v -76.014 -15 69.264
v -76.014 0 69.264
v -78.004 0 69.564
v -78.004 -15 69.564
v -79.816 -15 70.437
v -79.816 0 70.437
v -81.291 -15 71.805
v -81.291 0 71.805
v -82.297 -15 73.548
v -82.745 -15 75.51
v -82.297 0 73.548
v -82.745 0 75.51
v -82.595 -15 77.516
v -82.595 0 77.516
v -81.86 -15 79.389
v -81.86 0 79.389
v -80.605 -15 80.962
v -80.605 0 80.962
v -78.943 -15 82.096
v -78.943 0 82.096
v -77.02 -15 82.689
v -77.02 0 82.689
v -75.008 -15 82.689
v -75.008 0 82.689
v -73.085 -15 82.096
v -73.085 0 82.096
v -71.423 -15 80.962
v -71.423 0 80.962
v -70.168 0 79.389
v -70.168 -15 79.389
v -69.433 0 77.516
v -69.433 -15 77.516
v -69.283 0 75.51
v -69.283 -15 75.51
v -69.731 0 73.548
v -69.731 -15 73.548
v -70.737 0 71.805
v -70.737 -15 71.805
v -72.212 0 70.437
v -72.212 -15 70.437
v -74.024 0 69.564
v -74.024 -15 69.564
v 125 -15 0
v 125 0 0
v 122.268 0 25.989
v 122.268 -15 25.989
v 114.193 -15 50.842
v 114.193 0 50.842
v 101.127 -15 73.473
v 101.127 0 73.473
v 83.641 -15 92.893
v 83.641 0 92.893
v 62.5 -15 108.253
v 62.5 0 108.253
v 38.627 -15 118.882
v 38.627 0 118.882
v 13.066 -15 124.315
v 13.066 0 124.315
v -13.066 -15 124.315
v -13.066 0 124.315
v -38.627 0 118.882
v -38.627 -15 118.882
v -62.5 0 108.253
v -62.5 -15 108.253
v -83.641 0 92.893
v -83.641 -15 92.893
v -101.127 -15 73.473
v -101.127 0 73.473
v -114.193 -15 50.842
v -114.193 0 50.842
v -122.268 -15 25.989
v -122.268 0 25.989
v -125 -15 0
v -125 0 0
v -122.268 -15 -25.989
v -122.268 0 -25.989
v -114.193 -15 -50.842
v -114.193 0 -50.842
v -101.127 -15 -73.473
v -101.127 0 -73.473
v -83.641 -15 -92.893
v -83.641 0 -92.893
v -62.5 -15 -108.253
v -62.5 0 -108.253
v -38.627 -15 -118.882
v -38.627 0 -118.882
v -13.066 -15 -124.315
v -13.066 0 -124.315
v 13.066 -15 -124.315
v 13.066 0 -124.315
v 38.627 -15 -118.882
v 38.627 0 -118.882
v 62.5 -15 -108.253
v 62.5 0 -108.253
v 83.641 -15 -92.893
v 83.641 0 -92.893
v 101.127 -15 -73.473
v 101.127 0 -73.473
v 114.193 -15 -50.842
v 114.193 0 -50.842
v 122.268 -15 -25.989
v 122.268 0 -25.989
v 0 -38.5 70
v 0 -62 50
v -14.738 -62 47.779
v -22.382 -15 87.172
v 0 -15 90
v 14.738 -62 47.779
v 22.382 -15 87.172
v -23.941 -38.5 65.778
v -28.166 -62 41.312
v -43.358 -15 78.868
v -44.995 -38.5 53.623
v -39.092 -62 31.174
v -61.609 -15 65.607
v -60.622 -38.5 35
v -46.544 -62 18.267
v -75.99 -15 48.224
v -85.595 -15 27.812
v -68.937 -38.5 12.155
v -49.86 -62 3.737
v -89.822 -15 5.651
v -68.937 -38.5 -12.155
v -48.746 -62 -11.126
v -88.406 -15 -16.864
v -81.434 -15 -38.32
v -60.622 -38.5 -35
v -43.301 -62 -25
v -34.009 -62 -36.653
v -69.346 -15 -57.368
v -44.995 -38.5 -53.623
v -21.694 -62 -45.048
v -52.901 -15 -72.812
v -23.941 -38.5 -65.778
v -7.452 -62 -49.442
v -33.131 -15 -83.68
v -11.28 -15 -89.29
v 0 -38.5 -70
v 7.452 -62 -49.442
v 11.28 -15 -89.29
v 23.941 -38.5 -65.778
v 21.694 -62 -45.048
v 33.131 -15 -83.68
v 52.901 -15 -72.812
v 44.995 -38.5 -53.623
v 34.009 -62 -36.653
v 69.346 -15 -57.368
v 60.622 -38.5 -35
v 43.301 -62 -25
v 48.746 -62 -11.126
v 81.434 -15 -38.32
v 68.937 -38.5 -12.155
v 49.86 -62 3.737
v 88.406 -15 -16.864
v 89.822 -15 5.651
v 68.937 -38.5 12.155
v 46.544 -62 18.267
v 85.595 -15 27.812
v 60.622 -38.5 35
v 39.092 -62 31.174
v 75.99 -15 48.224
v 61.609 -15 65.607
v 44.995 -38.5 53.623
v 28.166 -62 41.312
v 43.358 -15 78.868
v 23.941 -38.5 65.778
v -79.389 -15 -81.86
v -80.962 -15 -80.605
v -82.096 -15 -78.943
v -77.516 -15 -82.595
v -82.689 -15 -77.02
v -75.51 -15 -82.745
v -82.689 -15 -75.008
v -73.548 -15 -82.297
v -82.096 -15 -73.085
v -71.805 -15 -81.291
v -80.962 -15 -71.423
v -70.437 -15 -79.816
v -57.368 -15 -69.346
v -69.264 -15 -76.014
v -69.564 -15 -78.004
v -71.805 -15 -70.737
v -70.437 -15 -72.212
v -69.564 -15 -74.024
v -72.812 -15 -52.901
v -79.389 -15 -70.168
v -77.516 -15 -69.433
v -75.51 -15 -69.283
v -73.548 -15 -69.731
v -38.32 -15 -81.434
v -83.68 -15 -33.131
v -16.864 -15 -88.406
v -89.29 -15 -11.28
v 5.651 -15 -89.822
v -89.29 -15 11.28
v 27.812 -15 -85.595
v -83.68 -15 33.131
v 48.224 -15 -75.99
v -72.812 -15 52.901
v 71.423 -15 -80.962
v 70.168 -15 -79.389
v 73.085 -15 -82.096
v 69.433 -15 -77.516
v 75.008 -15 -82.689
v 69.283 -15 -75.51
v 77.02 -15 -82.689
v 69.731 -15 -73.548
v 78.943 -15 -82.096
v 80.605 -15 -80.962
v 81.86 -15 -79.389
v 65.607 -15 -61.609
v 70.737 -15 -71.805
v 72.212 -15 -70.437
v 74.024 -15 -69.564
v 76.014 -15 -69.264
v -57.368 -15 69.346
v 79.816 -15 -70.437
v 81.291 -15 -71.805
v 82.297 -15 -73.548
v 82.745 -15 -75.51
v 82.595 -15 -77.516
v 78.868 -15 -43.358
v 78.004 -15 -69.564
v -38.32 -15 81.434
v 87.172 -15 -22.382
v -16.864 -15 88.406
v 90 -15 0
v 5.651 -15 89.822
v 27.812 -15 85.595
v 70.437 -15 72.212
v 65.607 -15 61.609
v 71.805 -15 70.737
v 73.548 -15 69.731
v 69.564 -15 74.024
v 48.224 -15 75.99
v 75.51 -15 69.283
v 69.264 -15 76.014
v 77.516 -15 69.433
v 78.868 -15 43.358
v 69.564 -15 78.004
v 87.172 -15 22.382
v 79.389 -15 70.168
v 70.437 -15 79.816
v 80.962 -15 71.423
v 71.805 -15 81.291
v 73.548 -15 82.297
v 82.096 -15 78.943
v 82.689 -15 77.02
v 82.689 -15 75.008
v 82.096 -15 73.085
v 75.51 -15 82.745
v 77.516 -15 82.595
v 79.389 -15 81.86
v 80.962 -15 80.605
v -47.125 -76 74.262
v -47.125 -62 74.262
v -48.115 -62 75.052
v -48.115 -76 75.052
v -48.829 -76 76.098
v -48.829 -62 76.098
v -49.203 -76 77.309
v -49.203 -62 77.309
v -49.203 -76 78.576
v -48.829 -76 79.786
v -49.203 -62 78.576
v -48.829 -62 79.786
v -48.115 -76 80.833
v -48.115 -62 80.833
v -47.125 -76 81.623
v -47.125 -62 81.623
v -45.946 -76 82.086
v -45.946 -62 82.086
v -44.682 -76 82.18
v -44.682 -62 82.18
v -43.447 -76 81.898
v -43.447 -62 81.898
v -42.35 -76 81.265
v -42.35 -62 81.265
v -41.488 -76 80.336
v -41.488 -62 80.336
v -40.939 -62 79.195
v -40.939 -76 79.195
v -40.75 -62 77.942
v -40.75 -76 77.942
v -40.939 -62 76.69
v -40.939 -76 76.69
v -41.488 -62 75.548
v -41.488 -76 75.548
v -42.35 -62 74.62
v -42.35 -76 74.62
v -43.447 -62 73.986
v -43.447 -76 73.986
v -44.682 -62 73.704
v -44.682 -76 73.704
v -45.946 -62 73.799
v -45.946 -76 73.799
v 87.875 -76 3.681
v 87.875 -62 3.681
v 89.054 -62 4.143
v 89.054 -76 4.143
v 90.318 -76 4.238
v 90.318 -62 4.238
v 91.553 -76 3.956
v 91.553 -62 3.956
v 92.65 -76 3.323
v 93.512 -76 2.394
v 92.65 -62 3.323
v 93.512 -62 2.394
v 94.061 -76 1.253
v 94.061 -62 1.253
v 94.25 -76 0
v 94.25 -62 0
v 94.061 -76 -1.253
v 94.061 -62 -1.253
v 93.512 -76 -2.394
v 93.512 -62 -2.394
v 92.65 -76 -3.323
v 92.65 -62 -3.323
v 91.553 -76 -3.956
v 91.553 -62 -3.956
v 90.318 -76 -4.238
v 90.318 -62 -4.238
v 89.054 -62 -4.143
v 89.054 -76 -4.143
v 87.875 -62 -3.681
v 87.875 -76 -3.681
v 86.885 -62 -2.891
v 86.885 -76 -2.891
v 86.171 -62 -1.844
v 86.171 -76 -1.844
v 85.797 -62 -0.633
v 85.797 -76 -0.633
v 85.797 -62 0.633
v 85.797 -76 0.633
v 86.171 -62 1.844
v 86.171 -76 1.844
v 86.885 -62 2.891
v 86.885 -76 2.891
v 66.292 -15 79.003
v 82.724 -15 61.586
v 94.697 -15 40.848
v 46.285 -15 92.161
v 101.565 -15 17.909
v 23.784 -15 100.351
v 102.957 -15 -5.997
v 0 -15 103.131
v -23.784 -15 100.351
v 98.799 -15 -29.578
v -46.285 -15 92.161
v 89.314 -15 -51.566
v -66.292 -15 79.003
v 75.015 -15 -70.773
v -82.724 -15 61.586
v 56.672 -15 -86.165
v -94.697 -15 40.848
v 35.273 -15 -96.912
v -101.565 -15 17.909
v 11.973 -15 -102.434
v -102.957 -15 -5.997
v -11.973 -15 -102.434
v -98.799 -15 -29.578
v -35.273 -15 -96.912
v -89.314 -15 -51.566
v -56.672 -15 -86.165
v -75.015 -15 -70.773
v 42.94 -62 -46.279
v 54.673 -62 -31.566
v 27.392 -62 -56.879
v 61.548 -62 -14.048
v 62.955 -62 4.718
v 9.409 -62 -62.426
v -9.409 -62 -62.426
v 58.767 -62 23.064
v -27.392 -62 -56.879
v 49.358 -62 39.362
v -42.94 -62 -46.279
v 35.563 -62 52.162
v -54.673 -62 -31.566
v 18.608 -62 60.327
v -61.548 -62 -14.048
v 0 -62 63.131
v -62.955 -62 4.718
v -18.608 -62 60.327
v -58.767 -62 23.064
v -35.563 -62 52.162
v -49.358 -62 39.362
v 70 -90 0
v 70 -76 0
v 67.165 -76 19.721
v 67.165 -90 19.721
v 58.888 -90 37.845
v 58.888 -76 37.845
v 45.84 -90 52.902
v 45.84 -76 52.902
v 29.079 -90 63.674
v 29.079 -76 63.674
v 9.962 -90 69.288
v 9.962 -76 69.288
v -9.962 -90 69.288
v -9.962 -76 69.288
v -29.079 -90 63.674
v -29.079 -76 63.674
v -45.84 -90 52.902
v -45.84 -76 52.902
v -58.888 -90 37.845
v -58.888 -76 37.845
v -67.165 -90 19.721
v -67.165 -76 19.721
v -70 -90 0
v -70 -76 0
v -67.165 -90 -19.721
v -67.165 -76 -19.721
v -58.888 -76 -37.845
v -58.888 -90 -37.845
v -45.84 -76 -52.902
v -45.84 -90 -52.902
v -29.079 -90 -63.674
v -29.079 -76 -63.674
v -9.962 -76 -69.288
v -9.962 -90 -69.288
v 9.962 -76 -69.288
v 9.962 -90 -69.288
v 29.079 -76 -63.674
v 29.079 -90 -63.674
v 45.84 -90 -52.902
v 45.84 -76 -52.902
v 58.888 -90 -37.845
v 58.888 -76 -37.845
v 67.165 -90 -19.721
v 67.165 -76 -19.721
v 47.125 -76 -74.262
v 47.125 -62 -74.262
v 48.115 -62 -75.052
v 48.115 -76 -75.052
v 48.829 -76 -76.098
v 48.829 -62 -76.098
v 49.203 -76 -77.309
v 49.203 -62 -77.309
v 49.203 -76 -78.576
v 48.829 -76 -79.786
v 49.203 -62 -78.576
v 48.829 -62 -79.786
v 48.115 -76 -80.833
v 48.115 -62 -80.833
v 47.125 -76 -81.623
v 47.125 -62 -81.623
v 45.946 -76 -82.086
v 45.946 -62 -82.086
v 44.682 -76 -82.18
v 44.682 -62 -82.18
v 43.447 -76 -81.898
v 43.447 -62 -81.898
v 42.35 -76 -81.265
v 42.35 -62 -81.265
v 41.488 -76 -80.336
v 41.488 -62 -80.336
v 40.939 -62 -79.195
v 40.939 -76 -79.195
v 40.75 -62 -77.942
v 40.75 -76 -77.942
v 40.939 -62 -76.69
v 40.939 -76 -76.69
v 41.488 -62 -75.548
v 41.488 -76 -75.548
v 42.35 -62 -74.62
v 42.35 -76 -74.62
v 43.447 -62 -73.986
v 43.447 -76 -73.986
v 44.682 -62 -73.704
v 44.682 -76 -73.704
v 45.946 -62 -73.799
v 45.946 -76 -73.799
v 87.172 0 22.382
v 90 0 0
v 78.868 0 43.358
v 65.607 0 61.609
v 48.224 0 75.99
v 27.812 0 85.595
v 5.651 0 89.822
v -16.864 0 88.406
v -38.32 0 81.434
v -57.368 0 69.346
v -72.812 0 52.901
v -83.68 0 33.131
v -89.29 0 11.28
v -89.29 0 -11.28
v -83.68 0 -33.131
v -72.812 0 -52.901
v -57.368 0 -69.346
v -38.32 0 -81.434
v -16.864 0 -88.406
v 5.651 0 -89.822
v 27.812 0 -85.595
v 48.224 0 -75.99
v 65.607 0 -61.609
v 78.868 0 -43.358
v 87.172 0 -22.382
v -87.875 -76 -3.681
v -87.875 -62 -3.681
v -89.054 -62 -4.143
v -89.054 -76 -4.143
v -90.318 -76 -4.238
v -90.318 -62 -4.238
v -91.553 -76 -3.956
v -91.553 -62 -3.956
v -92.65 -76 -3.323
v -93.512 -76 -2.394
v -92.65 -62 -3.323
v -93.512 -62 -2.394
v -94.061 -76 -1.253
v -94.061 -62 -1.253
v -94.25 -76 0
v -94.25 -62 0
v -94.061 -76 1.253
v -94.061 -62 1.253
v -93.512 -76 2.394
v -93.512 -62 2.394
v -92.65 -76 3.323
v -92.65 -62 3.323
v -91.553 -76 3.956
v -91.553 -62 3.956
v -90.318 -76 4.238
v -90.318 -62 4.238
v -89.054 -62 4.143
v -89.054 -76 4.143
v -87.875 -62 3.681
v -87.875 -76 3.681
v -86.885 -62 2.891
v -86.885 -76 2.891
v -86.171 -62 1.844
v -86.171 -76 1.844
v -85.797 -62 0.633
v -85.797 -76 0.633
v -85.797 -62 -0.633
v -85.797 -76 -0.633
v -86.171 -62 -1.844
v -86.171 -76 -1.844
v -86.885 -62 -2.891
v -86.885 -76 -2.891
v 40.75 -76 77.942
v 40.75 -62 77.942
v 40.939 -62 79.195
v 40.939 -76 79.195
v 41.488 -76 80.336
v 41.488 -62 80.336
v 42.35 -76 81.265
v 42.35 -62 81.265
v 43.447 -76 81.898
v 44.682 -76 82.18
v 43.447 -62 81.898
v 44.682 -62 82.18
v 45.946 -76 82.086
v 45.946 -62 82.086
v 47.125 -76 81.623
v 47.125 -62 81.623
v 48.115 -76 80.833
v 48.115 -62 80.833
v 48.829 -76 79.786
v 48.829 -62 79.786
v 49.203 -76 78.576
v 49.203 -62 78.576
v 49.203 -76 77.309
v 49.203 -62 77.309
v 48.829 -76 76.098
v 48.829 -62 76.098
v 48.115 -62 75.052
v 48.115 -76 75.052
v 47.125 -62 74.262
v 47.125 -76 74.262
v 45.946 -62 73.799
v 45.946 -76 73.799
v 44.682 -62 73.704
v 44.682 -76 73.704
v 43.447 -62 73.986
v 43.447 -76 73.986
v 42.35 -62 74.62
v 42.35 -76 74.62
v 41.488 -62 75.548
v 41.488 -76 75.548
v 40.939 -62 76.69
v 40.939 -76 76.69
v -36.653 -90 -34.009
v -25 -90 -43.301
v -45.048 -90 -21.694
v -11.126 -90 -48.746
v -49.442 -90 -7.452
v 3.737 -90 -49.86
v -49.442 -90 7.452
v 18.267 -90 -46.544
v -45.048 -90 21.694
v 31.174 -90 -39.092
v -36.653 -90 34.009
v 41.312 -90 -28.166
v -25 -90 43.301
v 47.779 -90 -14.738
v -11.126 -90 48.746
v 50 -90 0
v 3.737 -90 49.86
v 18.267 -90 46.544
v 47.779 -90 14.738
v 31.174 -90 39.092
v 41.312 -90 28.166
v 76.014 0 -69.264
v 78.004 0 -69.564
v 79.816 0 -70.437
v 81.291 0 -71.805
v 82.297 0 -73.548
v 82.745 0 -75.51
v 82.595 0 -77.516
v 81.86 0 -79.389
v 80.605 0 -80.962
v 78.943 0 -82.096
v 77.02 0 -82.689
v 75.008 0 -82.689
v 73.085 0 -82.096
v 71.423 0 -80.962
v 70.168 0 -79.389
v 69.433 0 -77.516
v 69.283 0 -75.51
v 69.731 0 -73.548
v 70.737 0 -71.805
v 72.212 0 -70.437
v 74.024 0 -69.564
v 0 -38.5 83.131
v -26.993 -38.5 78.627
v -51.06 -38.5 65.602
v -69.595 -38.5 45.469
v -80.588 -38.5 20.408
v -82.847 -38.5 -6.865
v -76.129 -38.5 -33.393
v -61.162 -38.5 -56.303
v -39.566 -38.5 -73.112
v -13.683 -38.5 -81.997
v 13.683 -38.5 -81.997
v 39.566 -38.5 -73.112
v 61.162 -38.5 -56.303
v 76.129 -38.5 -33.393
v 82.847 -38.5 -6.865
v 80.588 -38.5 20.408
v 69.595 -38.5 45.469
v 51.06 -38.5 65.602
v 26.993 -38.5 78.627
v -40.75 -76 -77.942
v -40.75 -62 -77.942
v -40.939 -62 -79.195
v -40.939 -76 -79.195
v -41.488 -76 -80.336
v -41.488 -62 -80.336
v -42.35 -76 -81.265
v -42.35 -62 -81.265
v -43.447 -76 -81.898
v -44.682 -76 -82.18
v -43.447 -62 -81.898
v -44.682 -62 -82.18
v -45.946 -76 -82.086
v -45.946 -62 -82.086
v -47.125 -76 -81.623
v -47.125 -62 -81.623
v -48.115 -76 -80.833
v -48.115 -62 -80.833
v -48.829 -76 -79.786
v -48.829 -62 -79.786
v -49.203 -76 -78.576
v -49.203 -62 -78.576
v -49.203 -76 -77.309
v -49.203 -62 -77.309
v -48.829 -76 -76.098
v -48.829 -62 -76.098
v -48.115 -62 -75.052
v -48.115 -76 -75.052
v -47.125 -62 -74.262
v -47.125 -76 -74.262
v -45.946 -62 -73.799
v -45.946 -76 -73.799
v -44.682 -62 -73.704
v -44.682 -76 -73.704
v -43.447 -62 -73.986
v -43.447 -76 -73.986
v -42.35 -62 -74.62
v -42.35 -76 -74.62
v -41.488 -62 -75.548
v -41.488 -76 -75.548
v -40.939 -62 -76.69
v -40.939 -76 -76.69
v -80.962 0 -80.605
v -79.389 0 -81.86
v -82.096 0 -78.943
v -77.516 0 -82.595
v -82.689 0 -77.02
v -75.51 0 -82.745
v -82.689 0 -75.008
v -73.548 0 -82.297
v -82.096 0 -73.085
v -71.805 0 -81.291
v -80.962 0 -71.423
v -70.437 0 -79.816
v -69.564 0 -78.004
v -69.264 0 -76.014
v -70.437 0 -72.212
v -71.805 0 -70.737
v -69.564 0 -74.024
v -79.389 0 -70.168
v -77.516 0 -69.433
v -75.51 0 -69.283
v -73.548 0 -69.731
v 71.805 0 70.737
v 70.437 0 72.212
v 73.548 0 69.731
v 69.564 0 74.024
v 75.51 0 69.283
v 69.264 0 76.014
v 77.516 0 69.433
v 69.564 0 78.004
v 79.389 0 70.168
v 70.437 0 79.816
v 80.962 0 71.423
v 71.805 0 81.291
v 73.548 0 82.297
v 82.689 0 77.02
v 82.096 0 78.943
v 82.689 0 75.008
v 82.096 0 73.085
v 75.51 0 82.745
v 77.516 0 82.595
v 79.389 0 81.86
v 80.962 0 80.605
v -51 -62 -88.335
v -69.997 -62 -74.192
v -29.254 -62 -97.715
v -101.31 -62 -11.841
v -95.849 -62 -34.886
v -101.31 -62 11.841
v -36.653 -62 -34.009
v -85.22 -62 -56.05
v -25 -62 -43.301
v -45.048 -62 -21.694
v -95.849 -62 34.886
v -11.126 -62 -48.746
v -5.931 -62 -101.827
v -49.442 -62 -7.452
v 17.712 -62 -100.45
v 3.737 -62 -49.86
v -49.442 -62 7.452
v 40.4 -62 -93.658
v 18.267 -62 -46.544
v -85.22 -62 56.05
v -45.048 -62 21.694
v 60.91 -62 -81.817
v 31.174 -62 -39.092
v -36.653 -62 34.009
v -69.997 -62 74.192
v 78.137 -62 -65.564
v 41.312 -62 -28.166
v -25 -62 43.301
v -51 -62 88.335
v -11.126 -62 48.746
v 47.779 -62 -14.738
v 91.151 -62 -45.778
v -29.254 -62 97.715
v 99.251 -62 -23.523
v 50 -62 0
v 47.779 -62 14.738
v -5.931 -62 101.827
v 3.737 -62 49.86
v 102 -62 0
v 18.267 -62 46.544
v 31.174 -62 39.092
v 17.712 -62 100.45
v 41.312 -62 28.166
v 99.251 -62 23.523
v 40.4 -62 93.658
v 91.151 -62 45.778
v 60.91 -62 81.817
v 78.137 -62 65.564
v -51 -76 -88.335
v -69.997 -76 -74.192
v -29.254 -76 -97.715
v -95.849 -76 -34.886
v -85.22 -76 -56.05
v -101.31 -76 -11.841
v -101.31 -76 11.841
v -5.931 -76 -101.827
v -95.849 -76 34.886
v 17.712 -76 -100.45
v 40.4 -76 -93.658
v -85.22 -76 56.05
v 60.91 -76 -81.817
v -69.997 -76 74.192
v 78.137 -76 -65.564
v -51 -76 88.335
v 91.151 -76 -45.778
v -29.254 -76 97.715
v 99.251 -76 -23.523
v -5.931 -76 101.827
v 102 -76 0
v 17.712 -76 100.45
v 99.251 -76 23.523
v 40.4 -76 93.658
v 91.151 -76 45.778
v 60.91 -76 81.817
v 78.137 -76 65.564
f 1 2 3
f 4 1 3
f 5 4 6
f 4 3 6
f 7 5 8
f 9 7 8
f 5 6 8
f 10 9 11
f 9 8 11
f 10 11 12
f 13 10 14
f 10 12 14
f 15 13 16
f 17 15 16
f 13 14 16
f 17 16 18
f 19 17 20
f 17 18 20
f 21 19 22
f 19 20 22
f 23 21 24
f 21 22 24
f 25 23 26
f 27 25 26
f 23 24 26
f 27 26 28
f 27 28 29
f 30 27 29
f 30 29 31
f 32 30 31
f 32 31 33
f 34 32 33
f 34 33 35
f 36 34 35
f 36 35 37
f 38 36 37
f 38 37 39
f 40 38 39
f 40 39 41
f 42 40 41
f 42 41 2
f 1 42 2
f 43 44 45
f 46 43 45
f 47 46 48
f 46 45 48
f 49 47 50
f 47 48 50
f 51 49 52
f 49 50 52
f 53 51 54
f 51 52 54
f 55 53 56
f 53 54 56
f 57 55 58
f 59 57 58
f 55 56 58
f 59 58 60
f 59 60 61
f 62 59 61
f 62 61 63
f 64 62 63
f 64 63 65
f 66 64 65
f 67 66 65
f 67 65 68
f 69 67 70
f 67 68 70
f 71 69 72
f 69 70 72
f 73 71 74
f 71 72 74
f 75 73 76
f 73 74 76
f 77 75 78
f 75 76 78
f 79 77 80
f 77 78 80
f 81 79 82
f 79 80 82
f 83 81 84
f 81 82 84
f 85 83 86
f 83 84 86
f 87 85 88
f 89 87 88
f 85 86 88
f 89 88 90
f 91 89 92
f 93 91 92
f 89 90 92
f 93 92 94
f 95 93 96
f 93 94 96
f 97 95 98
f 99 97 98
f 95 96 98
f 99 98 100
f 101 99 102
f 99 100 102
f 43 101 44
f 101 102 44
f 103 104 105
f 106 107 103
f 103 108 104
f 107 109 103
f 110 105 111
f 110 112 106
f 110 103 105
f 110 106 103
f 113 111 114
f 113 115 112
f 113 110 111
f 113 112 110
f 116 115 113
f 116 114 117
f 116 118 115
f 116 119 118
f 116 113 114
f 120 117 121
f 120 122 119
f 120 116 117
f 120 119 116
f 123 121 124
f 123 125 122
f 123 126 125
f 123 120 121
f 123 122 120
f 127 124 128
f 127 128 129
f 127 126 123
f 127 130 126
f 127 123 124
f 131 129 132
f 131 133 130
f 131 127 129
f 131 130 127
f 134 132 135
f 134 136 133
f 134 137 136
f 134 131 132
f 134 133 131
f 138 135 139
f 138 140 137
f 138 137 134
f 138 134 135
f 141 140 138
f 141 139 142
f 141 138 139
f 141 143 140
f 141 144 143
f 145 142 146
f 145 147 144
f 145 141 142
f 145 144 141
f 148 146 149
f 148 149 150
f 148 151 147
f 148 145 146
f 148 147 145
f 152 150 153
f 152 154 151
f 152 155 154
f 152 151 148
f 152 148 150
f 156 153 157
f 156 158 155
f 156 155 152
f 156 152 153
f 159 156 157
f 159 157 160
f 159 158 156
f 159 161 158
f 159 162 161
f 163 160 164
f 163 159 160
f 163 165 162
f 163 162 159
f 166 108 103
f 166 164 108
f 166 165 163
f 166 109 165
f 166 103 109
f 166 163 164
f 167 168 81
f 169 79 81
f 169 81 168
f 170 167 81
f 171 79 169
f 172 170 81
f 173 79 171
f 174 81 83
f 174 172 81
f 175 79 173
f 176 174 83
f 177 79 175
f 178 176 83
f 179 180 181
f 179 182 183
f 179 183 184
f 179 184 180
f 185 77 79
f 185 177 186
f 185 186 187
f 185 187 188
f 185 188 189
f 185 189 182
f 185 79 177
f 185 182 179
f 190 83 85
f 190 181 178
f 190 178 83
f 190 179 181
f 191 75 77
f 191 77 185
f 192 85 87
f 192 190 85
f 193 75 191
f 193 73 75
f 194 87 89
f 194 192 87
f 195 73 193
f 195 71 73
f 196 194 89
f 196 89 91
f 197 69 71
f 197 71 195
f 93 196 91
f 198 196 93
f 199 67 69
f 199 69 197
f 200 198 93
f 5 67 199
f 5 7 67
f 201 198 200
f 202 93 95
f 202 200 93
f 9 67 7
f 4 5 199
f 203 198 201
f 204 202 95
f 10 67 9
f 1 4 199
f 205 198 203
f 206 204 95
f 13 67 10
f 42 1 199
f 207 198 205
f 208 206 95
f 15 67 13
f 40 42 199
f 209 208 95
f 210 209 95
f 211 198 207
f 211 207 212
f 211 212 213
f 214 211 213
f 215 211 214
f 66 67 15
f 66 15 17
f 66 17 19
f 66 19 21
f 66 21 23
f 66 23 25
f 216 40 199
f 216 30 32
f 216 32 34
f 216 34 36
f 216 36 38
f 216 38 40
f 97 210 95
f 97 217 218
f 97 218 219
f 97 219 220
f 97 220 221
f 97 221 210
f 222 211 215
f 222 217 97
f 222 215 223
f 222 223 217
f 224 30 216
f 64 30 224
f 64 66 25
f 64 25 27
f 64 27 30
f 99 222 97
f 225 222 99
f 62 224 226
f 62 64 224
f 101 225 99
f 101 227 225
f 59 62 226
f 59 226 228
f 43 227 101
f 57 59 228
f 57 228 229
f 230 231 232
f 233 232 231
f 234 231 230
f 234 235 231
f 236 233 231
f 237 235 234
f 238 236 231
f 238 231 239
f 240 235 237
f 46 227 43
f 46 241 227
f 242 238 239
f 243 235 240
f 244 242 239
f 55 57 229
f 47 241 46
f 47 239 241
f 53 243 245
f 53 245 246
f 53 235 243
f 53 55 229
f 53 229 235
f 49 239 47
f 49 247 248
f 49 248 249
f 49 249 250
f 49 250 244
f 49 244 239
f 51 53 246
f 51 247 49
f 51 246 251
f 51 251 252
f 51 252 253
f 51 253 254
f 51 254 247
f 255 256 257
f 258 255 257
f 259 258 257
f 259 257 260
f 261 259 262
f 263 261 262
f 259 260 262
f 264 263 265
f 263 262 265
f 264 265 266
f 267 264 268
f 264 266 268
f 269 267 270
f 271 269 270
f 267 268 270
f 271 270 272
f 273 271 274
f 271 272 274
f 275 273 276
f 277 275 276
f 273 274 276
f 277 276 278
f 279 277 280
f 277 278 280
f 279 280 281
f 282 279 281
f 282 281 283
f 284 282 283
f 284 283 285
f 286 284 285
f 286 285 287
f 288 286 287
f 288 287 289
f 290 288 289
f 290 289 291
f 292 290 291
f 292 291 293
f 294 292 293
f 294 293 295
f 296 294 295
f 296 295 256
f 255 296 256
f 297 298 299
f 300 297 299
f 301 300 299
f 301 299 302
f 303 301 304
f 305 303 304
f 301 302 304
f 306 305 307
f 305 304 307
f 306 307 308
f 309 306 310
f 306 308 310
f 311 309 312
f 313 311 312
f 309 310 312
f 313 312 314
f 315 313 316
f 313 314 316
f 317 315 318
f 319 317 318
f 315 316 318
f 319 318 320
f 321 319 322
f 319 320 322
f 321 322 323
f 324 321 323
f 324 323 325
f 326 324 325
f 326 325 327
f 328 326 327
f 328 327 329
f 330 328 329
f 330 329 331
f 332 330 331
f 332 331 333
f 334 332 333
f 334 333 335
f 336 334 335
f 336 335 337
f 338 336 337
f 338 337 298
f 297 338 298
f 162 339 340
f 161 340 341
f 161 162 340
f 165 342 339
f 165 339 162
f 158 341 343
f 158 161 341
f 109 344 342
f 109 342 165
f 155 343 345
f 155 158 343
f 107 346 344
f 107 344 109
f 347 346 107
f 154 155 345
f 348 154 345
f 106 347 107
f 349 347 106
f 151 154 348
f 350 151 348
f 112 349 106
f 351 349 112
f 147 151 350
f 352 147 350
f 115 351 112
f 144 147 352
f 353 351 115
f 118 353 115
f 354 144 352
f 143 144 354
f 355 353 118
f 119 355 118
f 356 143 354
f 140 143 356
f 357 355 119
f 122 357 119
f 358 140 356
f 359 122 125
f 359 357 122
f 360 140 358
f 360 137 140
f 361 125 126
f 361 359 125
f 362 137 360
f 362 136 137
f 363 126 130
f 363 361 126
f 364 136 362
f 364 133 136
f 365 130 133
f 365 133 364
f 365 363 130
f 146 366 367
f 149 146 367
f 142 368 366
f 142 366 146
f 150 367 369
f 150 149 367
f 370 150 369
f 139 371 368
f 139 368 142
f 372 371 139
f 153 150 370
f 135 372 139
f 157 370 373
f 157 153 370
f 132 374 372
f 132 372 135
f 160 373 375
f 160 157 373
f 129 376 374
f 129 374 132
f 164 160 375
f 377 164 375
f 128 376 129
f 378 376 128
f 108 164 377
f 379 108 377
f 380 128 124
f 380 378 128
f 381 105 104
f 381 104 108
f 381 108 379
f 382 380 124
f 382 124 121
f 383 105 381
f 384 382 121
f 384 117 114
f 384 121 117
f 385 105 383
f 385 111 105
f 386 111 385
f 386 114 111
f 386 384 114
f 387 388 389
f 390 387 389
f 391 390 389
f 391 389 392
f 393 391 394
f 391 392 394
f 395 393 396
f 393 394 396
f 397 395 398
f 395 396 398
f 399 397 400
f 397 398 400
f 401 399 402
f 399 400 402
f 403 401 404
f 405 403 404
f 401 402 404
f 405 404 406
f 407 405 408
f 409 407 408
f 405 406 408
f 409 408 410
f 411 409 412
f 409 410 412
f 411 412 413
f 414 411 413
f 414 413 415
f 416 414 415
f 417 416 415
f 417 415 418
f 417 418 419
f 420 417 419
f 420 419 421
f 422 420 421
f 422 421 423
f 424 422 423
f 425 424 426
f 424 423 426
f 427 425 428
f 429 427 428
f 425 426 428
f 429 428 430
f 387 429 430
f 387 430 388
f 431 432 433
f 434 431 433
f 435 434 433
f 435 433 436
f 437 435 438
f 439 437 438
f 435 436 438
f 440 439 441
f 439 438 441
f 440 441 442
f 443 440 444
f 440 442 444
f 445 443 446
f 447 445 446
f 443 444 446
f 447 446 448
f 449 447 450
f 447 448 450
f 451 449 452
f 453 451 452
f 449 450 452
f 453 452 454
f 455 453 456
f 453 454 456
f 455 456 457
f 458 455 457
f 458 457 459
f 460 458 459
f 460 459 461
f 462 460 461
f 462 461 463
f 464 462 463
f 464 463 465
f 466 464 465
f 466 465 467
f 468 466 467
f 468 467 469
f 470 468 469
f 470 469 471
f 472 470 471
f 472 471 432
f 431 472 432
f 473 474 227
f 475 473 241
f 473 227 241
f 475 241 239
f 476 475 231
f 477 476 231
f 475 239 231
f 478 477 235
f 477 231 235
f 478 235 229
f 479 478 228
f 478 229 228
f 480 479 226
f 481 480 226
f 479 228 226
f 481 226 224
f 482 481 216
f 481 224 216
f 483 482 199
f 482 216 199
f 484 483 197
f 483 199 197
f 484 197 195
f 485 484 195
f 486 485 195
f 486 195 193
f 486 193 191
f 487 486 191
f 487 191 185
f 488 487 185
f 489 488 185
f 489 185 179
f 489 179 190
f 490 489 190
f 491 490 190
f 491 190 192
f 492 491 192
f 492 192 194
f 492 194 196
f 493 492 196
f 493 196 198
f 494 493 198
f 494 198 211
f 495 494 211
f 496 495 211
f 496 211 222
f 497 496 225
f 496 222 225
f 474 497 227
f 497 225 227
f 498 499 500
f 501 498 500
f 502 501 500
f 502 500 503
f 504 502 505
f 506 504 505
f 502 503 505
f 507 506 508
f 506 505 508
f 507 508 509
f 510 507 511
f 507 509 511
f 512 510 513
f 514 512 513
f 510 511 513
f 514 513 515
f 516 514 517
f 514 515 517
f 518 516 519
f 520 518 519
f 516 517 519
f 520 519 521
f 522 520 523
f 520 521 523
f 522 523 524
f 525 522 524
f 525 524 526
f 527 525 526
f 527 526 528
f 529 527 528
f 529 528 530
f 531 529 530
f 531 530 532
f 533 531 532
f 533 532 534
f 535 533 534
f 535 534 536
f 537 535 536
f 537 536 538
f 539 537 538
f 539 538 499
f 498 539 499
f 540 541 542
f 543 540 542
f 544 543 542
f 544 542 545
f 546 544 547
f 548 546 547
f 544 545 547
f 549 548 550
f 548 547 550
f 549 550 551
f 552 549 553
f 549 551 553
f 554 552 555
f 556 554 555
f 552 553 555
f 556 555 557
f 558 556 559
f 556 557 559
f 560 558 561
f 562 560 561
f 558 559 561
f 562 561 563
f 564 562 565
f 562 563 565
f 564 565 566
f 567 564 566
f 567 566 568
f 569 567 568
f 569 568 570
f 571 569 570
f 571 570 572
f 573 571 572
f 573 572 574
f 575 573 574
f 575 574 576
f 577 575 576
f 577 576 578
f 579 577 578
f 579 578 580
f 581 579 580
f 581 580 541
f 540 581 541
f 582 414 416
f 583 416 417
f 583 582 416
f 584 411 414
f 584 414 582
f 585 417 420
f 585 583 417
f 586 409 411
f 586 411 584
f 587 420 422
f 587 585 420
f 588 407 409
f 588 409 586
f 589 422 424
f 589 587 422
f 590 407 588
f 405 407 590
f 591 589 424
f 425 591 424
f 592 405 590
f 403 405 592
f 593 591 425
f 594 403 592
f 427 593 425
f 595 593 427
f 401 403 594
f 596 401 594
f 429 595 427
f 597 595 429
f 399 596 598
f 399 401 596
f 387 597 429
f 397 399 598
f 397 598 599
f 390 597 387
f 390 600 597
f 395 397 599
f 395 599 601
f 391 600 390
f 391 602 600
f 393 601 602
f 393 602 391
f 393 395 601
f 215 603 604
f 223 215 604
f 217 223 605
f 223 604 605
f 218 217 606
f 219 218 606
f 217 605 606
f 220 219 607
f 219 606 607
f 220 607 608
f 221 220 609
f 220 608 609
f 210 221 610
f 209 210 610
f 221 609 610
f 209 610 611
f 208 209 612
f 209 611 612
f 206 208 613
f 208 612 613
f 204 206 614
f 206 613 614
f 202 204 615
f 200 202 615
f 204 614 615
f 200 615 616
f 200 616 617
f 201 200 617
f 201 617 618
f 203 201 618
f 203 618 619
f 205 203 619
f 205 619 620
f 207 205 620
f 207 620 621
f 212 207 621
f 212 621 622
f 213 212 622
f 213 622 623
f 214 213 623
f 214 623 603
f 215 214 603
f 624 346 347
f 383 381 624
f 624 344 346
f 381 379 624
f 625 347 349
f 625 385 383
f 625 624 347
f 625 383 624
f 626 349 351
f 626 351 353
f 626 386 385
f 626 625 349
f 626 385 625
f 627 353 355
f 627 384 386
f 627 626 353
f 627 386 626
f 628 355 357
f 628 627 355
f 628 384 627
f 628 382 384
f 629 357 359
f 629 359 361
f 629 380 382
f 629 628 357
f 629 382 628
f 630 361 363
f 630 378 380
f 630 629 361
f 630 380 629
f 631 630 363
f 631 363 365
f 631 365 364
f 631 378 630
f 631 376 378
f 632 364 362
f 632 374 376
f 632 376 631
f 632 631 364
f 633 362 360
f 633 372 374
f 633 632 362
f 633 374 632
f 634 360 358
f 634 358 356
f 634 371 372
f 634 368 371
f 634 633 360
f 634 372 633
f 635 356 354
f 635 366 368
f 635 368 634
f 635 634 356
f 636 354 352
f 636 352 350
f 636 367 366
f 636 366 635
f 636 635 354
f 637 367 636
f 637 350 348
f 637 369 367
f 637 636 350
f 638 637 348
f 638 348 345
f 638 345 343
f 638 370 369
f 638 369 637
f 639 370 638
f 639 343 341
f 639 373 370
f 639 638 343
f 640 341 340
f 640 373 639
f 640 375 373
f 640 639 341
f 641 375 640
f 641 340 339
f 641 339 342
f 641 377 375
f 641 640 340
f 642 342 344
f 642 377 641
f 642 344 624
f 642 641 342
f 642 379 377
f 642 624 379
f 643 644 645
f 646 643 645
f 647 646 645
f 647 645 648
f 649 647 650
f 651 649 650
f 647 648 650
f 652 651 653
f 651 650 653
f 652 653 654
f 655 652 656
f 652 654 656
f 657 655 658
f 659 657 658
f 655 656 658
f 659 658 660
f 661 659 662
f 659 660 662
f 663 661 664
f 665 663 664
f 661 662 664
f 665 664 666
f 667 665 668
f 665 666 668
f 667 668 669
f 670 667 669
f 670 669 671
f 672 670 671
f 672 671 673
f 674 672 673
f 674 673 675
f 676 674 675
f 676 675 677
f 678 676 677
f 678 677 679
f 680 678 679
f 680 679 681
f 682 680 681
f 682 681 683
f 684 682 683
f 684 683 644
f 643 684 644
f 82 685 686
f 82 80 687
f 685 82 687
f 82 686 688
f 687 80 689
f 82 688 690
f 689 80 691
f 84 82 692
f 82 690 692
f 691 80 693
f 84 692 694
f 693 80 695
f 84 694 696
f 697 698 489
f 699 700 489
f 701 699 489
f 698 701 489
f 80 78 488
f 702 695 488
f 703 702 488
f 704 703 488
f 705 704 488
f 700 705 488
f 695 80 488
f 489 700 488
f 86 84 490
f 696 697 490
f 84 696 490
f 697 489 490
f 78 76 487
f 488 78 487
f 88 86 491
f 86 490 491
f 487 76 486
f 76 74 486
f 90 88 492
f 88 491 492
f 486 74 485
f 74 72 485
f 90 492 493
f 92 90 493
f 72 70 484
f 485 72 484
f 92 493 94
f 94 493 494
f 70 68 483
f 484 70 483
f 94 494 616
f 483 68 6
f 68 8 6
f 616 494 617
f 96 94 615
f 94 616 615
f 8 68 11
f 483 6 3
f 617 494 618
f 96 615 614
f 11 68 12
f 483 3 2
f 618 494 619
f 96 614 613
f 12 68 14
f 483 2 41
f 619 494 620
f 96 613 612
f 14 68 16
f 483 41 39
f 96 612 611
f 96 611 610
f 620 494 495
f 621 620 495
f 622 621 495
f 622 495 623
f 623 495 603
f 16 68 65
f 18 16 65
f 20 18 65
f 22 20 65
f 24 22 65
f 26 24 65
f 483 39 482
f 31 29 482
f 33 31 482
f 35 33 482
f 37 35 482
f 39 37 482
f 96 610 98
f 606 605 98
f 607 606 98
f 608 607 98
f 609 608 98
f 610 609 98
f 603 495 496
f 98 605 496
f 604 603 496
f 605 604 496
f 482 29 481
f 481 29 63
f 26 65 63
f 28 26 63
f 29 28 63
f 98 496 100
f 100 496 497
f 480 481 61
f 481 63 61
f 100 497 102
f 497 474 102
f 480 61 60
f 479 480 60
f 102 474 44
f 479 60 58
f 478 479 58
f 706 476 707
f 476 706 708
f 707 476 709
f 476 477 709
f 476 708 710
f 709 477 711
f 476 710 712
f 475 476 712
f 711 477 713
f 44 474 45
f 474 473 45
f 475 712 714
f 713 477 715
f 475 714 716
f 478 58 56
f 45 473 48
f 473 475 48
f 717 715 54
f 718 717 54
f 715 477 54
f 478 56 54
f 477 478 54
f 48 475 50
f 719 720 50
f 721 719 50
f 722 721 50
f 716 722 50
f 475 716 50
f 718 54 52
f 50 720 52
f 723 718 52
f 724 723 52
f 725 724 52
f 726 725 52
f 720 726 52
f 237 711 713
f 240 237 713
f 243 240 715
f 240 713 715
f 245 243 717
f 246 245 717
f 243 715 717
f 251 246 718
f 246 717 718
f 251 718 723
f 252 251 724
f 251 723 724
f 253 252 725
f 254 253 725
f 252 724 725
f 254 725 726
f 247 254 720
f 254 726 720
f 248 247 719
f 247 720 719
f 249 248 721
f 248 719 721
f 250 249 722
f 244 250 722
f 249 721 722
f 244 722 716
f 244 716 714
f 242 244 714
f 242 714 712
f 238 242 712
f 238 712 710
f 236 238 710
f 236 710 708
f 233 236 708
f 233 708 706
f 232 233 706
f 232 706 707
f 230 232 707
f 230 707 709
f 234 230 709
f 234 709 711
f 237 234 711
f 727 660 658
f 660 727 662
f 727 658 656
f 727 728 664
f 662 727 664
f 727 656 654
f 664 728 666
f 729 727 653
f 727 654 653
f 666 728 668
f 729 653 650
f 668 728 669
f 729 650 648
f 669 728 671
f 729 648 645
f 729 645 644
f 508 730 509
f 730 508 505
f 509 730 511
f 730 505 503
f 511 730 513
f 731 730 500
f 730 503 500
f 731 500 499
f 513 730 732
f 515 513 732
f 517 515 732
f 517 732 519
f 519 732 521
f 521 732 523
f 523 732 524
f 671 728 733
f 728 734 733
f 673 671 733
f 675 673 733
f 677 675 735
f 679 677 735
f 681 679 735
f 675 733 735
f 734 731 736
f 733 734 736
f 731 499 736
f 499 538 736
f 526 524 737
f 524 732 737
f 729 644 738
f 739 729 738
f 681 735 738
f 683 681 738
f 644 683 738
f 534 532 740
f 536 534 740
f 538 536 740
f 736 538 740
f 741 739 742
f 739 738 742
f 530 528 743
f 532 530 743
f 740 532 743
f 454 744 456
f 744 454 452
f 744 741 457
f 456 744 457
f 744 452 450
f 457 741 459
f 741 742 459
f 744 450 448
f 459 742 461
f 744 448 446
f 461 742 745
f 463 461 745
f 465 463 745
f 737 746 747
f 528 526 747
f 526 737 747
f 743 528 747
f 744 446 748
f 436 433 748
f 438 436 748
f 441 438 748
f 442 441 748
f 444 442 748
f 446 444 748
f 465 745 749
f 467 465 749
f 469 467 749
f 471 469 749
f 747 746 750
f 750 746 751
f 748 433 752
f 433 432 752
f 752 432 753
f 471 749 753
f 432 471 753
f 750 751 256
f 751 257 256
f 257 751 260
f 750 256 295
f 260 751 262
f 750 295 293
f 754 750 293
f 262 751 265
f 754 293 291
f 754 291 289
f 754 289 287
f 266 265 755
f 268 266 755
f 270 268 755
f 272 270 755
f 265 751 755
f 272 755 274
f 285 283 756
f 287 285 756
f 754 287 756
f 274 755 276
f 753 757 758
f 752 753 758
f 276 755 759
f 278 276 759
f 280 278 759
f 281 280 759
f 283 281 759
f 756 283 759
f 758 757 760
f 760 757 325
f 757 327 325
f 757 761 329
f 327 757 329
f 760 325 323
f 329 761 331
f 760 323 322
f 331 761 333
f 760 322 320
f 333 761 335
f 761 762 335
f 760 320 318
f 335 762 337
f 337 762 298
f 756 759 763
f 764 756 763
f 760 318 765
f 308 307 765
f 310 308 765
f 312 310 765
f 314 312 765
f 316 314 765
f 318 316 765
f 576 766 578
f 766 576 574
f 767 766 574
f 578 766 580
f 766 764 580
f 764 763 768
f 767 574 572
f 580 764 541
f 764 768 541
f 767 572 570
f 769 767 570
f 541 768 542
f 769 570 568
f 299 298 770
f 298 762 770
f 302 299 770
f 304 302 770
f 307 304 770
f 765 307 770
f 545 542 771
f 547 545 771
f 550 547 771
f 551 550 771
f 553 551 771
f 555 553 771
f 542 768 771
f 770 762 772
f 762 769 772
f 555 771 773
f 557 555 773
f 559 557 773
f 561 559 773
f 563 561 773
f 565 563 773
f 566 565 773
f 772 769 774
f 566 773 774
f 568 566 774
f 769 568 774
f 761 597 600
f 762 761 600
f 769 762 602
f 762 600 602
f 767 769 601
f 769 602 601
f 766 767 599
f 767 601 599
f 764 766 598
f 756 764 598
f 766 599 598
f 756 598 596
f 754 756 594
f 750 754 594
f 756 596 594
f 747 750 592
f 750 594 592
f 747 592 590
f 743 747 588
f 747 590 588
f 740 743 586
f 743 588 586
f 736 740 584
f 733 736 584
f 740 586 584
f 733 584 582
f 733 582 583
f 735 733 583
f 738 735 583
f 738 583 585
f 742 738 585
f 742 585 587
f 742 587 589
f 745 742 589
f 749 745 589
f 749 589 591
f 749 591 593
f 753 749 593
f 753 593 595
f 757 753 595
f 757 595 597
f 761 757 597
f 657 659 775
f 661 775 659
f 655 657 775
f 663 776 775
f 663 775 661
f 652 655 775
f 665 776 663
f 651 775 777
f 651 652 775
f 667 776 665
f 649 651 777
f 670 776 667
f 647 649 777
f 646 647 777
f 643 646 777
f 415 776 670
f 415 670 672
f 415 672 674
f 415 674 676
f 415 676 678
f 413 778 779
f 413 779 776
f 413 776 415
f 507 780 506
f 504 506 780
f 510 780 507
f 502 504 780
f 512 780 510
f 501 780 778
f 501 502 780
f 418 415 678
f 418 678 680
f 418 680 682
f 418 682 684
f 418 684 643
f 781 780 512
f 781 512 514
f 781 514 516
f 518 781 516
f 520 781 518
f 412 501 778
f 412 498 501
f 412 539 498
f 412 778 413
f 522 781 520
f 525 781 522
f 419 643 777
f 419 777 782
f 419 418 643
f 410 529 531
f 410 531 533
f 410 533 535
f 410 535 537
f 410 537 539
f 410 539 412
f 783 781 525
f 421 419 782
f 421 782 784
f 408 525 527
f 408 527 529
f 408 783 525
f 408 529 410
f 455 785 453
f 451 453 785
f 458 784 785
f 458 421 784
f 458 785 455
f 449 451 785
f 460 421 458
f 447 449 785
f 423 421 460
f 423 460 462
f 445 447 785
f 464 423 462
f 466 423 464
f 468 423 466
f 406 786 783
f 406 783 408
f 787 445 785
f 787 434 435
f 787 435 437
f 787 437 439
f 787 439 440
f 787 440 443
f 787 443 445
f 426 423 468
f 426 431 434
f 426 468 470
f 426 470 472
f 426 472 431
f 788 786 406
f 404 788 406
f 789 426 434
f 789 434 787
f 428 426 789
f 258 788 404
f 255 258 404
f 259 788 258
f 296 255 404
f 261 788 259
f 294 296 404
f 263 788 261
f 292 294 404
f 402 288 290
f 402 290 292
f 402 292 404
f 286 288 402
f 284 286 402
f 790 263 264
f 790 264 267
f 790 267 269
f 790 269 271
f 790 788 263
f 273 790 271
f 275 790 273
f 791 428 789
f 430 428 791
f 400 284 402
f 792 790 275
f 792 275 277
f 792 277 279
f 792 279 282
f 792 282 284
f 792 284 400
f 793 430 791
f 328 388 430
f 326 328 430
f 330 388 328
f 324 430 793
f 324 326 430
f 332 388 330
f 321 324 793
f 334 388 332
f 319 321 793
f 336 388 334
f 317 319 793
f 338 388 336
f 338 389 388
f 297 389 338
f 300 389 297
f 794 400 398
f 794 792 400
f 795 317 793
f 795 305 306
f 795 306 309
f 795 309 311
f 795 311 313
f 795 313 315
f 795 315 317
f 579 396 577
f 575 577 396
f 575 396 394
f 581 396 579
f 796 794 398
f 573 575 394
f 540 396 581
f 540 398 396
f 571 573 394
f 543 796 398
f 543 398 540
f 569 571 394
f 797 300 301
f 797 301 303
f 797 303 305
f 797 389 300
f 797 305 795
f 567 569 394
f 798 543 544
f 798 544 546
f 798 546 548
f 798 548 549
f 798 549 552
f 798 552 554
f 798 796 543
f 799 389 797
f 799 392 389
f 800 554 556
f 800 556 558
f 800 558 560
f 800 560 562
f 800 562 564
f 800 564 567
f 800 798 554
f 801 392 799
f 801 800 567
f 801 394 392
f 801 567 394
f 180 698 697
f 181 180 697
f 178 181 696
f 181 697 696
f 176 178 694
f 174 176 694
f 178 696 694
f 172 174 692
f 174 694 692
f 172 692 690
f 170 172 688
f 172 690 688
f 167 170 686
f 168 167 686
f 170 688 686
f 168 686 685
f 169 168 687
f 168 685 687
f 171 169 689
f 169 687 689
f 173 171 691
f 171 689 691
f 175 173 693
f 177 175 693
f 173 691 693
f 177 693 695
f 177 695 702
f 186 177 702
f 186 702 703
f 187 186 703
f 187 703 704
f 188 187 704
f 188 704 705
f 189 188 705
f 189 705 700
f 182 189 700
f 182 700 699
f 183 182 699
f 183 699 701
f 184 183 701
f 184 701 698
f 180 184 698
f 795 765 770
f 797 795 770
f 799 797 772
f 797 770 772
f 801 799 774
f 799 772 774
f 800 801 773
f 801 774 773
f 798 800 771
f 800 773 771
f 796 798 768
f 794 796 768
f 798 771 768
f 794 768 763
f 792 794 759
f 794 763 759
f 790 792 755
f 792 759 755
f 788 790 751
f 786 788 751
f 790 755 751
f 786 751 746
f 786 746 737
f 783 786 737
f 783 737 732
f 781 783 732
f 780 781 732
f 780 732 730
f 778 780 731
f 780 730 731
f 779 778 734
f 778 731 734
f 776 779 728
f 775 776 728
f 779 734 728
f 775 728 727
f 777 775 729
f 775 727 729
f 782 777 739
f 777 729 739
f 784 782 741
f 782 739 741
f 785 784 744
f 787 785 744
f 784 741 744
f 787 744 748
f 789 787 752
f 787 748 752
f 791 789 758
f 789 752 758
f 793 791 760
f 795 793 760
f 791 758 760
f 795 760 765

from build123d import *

# Parameters (mm, degrees)
F0_R             = 125
F1_DEPTH         = 15
F4_R             = 102
F5_DEPTH         = 14
F6_R             = 70
F7_DEPTH         = 14
F9_D             = 8.5
F9_DEPTH         = 19.5
F9_TIP           = 2.5536576309
F9_COPIES_COUNT  = 6
F2_R             = 90
F10_DEPTH        = 25
F12_D            = 13.5
F12_DEPTH        = 20
F12_TIP          = 4.0558091784
F12_COPIES_COUNT = 4
F13_R            = 50
F14_DEPTH        = 90.001


# Not quite as in the source:
# - a pattern or mirror of a feature is missing from the dataset's text; its kind, count and spacing are read off the source's solid


with BuildPart() as f1:
    # F0 (on Front) → F1 (new body)
    with BuildSketch(Plane.XZ):
        Circle(F0_R)
    extrude(amount=F1_DEPTH)

    # F2 (on face) → F10 (cut)
    with BuildSketch(Plane.XZ.offset(15)):
        Circle(F2_R)
    extrude(amount=-F10_DEPTH, mode=Mode.SUBTRACT)

    # F12
    with Locations(Plane.XZ.offset(15)):
        with Locations((76.0139789776, 76.0139789776)):
            f12 = Hole(F12_D / 2, depth=F12_DEPTH)
            with Locations((0, 0, -(F12_DEPTH + F12_TIP / 2))):  # 118° drill point
                Cone(0, F12_D / 2, F12_TIP, mode=Mode.SUBTRACT)

    # F12_copies: F12 ×4 about axis
    f12_copies_axis = Axis((0, 0, 0), (0, 1, 0))
    for i in range(1, F12_COPIES_COUNT):
        add(f12.rotate(f12_copies_axis, i * 360 / F12_COPIES_COUNT), mode=Mode.SUBTRACT)


with BuildPart() as f5:
    # F4 (on offset) → F5 (new body)
    with BuildSketch(Plane.XZ.offset(62)):
        Circle(F4_R)
    extrude(amount=F5_DEPTH)

    # F6 (on face) → F7 (join)
    with BuildSketch(Plane.XZ.offset(76)):
        Circle(F6_R)
    extrude(amount=F7_DEPTH)

    # F9
    with Locations(Plane.XZ.offset(76)):
        with Locations((45, 77.9422863406)):
            f9 = Hole(F9_D / 2, depth=F9_DEPTH)
            with Locations((0, 0, -(F9_DEPTH + F9_TIP / 2))):  # 118° drill point
                Cone(0, F9_D / 2, F9_TIP, mode=Mode.SUBTRACT)

    # F9_copies: F9 ×6 about axis
    f9_copies_axis = Axis((0, 0, 0), (0, 1, 0))
    for i in range(1, F9_COPIES_COUNT):
        add(f9.rotate(f9_copies_axis, i * 360 / F9_COPIES_COUNT), mode=Mode.SUBTRACT)

    # F13 (on face) → F14 (cut, through all)
    with BuildSketch(Plane.XZ.offset(90)):
        Circle(F13_R)
    extrude(amount=-F14_DEPTH, mode=Mode.SUBTRACT)


with BuildPart() as f16:
    # F15 (on Right) → F16 (revolve)
    with BuildSketch(Plane.YZ):
        Polygon((-62, 63.131297127), (-62, 50), (-15, 90), (-15, 103.131297127), align=None)
    revolve(axis=Axis((0, -76, 0), (0, -1, 0)))


solid = Compound([f1.part, f5.part, f16.part])
